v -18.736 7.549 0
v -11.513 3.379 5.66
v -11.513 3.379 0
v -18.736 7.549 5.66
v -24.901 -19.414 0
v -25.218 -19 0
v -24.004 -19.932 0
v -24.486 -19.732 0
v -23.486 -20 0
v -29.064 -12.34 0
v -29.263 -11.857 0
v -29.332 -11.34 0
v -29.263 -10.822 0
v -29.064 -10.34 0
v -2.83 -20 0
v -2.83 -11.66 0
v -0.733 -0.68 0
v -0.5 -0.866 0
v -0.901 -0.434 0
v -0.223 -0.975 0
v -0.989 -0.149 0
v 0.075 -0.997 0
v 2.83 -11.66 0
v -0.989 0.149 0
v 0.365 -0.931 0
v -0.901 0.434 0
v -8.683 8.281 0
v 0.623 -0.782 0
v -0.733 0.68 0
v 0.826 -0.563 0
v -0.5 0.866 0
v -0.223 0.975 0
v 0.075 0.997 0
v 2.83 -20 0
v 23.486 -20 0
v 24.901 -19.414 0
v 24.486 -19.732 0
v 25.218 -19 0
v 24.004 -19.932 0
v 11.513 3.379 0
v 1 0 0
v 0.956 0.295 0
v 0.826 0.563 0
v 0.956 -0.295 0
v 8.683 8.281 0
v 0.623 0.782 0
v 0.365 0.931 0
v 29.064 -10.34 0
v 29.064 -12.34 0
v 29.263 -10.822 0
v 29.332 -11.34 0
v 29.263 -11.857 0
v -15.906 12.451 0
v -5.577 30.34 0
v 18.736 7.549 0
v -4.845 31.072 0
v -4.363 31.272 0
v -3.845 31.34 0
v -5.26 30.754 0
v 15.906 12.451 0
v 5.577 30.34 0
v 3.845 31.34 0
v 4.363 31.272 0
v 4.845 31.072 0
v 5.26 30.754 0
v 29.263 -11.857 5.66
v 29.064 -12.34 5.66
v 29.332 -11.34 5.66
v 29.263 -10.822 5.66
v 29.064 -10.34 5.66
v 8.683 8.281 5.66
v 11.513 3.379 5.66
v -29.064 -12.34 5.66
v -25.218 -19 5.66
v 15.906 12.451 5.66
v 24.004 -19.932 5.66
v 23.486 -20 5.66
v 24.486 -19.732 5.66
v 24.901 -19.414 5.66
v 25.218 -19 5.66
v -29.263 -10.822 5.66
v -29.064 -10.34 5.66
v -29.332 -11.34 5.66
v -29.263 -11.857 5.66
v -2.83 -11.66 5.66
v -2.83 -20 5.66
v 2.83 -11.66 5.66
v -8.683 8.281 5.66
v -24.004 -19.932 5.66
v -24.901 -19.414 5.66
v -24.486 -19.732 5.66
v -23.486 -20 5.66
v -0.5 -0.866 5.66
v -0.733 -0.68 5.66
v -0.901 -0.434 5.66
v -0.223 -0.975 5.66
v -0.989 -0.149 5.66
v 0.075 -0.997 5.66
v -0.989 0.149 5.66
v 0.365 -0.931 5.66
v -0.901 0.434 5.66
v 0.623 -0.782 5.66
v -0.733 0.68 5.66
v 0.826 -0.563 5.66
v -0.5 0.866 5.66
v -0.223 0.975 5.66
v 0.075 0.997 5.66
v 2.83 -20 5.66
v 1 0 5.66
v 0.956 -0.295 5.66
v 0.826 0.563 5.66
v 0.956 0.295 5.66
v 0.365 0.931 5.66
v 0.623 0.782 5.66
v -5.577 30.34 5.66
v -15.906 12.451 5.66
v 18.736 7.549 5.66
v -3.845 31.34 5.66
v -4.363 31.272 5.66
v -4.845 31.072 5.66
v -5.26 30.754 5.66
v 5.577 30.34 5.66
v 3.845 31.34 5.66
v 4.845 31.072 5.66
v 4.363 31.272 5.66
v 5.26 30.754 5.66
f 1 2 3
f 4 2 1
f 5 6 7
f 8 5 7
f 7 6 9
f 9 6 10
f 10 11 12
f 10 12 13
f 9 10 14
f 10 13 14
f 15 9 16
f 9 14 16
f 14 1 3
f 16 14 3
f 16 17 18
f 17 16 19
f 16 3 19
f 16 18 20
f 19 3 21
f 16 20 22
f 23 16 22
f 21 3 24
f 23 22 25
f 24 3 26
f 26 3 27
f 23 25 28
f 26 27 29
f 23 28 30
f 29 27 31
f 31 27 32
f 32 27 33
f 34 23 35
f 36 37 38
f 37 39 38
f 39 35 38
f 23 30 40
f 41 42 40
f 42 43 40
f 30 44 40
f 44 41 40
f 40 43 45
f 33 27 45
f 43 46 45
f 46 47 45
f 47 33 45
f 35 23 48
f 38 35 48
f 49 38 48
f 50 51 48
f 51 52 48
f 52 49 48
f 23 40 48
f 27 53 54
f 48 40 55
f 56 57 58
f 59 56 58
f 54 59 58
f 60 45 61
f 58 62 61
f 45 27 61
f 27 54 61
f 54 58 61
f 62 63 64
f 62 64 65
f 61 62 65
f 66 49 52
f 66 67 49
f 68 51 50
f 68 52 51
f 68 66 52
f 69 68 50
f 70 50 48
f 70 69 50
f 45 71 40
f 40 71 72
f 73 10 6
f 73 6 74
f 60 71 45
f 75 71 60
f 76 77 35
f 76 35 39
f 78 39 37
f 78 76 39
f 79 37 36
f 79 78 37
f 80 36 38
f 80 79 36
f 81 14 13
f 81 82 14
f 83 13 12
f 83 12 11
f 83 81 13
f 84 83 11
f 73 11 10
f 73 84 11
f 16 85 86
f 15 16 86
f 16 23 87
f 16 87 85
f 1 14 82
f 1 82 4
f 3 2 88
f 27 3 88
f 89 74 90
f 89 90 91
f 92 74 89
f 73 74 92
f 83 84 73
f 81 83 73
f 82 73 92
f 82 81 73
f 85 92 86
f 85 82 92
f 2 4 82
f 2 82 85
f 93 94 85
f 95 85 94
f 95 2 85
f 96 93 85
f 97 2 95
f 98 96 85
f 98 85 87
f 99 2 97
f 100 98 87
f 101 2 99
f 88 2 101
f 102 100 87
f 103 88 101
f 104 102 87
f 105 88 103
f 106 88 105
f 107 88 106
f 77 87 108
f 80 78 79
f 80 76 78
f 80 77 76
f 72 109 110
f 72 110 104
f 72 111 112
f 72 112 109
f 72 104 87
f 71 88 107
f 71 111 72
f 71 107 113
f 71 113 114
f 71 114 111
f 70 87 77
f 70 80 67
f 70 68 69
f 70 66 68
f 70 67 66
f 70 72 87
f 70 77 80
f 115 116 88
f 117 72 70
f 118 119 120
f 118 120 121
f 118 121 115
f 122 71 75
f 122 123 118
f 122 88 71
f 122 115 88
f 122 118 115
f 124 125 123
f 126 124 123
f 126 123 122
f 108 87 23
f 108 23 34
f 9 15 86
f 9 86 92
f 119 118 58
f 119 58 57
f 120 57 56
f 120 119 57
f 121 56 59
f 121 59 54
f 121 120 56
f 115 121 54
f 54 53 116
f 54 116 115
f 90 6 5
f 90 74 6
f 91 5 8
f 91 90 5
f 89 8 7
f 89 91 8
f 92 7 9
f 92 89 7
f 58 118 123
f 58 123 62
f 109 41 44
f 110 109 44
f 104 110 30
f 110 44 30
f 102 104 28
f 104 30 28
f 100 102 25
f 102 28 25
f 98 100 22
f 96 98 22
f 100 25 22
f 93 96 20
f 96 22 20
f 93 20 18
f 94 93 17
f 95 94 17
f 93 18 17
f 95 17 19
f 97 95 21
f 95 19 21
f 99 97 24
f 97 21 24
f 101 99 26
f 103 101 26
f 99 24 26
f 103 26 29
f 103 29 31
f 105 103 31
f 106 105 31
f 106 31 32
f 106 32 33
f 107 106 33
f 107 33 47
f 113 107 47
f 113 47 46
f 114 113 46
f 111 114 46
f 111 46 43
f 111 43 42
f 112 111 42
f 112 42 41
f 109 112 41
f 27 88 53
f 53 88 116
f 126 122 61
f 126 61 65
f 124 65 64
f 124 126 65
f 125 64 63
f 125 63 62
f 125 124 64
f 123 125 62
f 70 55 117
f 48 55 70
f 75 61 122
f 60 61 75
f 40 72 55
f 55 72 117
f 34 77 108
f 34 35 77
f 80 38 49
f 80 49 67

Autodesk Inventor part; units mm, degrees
ref_plane "YZ Plane" through (0, 0, 0) normal (1, 0, 0) x (0, 1, 0)
ref_plane "XZ Plane" through (0, 0, 0) normal (0, 1, 0) x (-1, 0, 0)
ref_plane "XY Plane" through (0, 0, 0) normal (0, 0, 1) x (1, 0, 0)
sketch "Sketch1" plane through (0, 0, 0) normal (0, 0, 1) x (1, 0, 0)
  line L0 (0, 40) -> (34.641, -20)
  line L1 (34.641, -20) -> (-34.641, -20)
  line L2 (-34.641, -20) -> (0, 40)
  circle A0 centre (0, 0) radius 1
  dimension "d0" = 2
  dimension "d1" = 20
extrude "Extrusion1" add sketch "Sketch1" along normal blind 5.66
sketch "Sketch2" plane through (0, 0, 5.66) normal (0, 0, 1) x (1, 0, 0)
  circle A0 centre (0, 0) radius 1 projected
  line L0 (-34.641, -20) -> (34.641, -20) projected
  line L1 (0, -1) -> (0, 0)
  line L2 (-2.83, -11.66) -> (-2.83, -20)
  line L3 (2.83, -11.66) -> (2.83, -20)
  line L4 (2.83, -11.66) -> (-2.83, -11.66)
  point P0 (0, -20)
  dimension "d15" = 8.34
  dimension "d16" = 2.83
  dimension "d17" = 2.83
extrude "Extrusion2" cut sketch "Sketch2" against normal blind 8.625
pattern_circular "Circular Pattern1" count 3 over 360 about axis through (0, 0, 0) along (0, 0, 1) of "Extrusion2"
chamfer "Chamfer1" distance 10 angle 45 3 edges at (34.641, -20, 2.83) (-34.641, -20, 2.83) (0, 40, 2.83)
fillet "Fillet1" radius 2 6 edges at (-29.641, -11.3397, 2.83) (-24.641, -20, 2.83) (-5, 31.3397, 2.83) (5, 31.3397, 2.83) (29.641, -11.3397, 2.83) (24.641, -20, 2.83)
properties part number "Lower Platform"
